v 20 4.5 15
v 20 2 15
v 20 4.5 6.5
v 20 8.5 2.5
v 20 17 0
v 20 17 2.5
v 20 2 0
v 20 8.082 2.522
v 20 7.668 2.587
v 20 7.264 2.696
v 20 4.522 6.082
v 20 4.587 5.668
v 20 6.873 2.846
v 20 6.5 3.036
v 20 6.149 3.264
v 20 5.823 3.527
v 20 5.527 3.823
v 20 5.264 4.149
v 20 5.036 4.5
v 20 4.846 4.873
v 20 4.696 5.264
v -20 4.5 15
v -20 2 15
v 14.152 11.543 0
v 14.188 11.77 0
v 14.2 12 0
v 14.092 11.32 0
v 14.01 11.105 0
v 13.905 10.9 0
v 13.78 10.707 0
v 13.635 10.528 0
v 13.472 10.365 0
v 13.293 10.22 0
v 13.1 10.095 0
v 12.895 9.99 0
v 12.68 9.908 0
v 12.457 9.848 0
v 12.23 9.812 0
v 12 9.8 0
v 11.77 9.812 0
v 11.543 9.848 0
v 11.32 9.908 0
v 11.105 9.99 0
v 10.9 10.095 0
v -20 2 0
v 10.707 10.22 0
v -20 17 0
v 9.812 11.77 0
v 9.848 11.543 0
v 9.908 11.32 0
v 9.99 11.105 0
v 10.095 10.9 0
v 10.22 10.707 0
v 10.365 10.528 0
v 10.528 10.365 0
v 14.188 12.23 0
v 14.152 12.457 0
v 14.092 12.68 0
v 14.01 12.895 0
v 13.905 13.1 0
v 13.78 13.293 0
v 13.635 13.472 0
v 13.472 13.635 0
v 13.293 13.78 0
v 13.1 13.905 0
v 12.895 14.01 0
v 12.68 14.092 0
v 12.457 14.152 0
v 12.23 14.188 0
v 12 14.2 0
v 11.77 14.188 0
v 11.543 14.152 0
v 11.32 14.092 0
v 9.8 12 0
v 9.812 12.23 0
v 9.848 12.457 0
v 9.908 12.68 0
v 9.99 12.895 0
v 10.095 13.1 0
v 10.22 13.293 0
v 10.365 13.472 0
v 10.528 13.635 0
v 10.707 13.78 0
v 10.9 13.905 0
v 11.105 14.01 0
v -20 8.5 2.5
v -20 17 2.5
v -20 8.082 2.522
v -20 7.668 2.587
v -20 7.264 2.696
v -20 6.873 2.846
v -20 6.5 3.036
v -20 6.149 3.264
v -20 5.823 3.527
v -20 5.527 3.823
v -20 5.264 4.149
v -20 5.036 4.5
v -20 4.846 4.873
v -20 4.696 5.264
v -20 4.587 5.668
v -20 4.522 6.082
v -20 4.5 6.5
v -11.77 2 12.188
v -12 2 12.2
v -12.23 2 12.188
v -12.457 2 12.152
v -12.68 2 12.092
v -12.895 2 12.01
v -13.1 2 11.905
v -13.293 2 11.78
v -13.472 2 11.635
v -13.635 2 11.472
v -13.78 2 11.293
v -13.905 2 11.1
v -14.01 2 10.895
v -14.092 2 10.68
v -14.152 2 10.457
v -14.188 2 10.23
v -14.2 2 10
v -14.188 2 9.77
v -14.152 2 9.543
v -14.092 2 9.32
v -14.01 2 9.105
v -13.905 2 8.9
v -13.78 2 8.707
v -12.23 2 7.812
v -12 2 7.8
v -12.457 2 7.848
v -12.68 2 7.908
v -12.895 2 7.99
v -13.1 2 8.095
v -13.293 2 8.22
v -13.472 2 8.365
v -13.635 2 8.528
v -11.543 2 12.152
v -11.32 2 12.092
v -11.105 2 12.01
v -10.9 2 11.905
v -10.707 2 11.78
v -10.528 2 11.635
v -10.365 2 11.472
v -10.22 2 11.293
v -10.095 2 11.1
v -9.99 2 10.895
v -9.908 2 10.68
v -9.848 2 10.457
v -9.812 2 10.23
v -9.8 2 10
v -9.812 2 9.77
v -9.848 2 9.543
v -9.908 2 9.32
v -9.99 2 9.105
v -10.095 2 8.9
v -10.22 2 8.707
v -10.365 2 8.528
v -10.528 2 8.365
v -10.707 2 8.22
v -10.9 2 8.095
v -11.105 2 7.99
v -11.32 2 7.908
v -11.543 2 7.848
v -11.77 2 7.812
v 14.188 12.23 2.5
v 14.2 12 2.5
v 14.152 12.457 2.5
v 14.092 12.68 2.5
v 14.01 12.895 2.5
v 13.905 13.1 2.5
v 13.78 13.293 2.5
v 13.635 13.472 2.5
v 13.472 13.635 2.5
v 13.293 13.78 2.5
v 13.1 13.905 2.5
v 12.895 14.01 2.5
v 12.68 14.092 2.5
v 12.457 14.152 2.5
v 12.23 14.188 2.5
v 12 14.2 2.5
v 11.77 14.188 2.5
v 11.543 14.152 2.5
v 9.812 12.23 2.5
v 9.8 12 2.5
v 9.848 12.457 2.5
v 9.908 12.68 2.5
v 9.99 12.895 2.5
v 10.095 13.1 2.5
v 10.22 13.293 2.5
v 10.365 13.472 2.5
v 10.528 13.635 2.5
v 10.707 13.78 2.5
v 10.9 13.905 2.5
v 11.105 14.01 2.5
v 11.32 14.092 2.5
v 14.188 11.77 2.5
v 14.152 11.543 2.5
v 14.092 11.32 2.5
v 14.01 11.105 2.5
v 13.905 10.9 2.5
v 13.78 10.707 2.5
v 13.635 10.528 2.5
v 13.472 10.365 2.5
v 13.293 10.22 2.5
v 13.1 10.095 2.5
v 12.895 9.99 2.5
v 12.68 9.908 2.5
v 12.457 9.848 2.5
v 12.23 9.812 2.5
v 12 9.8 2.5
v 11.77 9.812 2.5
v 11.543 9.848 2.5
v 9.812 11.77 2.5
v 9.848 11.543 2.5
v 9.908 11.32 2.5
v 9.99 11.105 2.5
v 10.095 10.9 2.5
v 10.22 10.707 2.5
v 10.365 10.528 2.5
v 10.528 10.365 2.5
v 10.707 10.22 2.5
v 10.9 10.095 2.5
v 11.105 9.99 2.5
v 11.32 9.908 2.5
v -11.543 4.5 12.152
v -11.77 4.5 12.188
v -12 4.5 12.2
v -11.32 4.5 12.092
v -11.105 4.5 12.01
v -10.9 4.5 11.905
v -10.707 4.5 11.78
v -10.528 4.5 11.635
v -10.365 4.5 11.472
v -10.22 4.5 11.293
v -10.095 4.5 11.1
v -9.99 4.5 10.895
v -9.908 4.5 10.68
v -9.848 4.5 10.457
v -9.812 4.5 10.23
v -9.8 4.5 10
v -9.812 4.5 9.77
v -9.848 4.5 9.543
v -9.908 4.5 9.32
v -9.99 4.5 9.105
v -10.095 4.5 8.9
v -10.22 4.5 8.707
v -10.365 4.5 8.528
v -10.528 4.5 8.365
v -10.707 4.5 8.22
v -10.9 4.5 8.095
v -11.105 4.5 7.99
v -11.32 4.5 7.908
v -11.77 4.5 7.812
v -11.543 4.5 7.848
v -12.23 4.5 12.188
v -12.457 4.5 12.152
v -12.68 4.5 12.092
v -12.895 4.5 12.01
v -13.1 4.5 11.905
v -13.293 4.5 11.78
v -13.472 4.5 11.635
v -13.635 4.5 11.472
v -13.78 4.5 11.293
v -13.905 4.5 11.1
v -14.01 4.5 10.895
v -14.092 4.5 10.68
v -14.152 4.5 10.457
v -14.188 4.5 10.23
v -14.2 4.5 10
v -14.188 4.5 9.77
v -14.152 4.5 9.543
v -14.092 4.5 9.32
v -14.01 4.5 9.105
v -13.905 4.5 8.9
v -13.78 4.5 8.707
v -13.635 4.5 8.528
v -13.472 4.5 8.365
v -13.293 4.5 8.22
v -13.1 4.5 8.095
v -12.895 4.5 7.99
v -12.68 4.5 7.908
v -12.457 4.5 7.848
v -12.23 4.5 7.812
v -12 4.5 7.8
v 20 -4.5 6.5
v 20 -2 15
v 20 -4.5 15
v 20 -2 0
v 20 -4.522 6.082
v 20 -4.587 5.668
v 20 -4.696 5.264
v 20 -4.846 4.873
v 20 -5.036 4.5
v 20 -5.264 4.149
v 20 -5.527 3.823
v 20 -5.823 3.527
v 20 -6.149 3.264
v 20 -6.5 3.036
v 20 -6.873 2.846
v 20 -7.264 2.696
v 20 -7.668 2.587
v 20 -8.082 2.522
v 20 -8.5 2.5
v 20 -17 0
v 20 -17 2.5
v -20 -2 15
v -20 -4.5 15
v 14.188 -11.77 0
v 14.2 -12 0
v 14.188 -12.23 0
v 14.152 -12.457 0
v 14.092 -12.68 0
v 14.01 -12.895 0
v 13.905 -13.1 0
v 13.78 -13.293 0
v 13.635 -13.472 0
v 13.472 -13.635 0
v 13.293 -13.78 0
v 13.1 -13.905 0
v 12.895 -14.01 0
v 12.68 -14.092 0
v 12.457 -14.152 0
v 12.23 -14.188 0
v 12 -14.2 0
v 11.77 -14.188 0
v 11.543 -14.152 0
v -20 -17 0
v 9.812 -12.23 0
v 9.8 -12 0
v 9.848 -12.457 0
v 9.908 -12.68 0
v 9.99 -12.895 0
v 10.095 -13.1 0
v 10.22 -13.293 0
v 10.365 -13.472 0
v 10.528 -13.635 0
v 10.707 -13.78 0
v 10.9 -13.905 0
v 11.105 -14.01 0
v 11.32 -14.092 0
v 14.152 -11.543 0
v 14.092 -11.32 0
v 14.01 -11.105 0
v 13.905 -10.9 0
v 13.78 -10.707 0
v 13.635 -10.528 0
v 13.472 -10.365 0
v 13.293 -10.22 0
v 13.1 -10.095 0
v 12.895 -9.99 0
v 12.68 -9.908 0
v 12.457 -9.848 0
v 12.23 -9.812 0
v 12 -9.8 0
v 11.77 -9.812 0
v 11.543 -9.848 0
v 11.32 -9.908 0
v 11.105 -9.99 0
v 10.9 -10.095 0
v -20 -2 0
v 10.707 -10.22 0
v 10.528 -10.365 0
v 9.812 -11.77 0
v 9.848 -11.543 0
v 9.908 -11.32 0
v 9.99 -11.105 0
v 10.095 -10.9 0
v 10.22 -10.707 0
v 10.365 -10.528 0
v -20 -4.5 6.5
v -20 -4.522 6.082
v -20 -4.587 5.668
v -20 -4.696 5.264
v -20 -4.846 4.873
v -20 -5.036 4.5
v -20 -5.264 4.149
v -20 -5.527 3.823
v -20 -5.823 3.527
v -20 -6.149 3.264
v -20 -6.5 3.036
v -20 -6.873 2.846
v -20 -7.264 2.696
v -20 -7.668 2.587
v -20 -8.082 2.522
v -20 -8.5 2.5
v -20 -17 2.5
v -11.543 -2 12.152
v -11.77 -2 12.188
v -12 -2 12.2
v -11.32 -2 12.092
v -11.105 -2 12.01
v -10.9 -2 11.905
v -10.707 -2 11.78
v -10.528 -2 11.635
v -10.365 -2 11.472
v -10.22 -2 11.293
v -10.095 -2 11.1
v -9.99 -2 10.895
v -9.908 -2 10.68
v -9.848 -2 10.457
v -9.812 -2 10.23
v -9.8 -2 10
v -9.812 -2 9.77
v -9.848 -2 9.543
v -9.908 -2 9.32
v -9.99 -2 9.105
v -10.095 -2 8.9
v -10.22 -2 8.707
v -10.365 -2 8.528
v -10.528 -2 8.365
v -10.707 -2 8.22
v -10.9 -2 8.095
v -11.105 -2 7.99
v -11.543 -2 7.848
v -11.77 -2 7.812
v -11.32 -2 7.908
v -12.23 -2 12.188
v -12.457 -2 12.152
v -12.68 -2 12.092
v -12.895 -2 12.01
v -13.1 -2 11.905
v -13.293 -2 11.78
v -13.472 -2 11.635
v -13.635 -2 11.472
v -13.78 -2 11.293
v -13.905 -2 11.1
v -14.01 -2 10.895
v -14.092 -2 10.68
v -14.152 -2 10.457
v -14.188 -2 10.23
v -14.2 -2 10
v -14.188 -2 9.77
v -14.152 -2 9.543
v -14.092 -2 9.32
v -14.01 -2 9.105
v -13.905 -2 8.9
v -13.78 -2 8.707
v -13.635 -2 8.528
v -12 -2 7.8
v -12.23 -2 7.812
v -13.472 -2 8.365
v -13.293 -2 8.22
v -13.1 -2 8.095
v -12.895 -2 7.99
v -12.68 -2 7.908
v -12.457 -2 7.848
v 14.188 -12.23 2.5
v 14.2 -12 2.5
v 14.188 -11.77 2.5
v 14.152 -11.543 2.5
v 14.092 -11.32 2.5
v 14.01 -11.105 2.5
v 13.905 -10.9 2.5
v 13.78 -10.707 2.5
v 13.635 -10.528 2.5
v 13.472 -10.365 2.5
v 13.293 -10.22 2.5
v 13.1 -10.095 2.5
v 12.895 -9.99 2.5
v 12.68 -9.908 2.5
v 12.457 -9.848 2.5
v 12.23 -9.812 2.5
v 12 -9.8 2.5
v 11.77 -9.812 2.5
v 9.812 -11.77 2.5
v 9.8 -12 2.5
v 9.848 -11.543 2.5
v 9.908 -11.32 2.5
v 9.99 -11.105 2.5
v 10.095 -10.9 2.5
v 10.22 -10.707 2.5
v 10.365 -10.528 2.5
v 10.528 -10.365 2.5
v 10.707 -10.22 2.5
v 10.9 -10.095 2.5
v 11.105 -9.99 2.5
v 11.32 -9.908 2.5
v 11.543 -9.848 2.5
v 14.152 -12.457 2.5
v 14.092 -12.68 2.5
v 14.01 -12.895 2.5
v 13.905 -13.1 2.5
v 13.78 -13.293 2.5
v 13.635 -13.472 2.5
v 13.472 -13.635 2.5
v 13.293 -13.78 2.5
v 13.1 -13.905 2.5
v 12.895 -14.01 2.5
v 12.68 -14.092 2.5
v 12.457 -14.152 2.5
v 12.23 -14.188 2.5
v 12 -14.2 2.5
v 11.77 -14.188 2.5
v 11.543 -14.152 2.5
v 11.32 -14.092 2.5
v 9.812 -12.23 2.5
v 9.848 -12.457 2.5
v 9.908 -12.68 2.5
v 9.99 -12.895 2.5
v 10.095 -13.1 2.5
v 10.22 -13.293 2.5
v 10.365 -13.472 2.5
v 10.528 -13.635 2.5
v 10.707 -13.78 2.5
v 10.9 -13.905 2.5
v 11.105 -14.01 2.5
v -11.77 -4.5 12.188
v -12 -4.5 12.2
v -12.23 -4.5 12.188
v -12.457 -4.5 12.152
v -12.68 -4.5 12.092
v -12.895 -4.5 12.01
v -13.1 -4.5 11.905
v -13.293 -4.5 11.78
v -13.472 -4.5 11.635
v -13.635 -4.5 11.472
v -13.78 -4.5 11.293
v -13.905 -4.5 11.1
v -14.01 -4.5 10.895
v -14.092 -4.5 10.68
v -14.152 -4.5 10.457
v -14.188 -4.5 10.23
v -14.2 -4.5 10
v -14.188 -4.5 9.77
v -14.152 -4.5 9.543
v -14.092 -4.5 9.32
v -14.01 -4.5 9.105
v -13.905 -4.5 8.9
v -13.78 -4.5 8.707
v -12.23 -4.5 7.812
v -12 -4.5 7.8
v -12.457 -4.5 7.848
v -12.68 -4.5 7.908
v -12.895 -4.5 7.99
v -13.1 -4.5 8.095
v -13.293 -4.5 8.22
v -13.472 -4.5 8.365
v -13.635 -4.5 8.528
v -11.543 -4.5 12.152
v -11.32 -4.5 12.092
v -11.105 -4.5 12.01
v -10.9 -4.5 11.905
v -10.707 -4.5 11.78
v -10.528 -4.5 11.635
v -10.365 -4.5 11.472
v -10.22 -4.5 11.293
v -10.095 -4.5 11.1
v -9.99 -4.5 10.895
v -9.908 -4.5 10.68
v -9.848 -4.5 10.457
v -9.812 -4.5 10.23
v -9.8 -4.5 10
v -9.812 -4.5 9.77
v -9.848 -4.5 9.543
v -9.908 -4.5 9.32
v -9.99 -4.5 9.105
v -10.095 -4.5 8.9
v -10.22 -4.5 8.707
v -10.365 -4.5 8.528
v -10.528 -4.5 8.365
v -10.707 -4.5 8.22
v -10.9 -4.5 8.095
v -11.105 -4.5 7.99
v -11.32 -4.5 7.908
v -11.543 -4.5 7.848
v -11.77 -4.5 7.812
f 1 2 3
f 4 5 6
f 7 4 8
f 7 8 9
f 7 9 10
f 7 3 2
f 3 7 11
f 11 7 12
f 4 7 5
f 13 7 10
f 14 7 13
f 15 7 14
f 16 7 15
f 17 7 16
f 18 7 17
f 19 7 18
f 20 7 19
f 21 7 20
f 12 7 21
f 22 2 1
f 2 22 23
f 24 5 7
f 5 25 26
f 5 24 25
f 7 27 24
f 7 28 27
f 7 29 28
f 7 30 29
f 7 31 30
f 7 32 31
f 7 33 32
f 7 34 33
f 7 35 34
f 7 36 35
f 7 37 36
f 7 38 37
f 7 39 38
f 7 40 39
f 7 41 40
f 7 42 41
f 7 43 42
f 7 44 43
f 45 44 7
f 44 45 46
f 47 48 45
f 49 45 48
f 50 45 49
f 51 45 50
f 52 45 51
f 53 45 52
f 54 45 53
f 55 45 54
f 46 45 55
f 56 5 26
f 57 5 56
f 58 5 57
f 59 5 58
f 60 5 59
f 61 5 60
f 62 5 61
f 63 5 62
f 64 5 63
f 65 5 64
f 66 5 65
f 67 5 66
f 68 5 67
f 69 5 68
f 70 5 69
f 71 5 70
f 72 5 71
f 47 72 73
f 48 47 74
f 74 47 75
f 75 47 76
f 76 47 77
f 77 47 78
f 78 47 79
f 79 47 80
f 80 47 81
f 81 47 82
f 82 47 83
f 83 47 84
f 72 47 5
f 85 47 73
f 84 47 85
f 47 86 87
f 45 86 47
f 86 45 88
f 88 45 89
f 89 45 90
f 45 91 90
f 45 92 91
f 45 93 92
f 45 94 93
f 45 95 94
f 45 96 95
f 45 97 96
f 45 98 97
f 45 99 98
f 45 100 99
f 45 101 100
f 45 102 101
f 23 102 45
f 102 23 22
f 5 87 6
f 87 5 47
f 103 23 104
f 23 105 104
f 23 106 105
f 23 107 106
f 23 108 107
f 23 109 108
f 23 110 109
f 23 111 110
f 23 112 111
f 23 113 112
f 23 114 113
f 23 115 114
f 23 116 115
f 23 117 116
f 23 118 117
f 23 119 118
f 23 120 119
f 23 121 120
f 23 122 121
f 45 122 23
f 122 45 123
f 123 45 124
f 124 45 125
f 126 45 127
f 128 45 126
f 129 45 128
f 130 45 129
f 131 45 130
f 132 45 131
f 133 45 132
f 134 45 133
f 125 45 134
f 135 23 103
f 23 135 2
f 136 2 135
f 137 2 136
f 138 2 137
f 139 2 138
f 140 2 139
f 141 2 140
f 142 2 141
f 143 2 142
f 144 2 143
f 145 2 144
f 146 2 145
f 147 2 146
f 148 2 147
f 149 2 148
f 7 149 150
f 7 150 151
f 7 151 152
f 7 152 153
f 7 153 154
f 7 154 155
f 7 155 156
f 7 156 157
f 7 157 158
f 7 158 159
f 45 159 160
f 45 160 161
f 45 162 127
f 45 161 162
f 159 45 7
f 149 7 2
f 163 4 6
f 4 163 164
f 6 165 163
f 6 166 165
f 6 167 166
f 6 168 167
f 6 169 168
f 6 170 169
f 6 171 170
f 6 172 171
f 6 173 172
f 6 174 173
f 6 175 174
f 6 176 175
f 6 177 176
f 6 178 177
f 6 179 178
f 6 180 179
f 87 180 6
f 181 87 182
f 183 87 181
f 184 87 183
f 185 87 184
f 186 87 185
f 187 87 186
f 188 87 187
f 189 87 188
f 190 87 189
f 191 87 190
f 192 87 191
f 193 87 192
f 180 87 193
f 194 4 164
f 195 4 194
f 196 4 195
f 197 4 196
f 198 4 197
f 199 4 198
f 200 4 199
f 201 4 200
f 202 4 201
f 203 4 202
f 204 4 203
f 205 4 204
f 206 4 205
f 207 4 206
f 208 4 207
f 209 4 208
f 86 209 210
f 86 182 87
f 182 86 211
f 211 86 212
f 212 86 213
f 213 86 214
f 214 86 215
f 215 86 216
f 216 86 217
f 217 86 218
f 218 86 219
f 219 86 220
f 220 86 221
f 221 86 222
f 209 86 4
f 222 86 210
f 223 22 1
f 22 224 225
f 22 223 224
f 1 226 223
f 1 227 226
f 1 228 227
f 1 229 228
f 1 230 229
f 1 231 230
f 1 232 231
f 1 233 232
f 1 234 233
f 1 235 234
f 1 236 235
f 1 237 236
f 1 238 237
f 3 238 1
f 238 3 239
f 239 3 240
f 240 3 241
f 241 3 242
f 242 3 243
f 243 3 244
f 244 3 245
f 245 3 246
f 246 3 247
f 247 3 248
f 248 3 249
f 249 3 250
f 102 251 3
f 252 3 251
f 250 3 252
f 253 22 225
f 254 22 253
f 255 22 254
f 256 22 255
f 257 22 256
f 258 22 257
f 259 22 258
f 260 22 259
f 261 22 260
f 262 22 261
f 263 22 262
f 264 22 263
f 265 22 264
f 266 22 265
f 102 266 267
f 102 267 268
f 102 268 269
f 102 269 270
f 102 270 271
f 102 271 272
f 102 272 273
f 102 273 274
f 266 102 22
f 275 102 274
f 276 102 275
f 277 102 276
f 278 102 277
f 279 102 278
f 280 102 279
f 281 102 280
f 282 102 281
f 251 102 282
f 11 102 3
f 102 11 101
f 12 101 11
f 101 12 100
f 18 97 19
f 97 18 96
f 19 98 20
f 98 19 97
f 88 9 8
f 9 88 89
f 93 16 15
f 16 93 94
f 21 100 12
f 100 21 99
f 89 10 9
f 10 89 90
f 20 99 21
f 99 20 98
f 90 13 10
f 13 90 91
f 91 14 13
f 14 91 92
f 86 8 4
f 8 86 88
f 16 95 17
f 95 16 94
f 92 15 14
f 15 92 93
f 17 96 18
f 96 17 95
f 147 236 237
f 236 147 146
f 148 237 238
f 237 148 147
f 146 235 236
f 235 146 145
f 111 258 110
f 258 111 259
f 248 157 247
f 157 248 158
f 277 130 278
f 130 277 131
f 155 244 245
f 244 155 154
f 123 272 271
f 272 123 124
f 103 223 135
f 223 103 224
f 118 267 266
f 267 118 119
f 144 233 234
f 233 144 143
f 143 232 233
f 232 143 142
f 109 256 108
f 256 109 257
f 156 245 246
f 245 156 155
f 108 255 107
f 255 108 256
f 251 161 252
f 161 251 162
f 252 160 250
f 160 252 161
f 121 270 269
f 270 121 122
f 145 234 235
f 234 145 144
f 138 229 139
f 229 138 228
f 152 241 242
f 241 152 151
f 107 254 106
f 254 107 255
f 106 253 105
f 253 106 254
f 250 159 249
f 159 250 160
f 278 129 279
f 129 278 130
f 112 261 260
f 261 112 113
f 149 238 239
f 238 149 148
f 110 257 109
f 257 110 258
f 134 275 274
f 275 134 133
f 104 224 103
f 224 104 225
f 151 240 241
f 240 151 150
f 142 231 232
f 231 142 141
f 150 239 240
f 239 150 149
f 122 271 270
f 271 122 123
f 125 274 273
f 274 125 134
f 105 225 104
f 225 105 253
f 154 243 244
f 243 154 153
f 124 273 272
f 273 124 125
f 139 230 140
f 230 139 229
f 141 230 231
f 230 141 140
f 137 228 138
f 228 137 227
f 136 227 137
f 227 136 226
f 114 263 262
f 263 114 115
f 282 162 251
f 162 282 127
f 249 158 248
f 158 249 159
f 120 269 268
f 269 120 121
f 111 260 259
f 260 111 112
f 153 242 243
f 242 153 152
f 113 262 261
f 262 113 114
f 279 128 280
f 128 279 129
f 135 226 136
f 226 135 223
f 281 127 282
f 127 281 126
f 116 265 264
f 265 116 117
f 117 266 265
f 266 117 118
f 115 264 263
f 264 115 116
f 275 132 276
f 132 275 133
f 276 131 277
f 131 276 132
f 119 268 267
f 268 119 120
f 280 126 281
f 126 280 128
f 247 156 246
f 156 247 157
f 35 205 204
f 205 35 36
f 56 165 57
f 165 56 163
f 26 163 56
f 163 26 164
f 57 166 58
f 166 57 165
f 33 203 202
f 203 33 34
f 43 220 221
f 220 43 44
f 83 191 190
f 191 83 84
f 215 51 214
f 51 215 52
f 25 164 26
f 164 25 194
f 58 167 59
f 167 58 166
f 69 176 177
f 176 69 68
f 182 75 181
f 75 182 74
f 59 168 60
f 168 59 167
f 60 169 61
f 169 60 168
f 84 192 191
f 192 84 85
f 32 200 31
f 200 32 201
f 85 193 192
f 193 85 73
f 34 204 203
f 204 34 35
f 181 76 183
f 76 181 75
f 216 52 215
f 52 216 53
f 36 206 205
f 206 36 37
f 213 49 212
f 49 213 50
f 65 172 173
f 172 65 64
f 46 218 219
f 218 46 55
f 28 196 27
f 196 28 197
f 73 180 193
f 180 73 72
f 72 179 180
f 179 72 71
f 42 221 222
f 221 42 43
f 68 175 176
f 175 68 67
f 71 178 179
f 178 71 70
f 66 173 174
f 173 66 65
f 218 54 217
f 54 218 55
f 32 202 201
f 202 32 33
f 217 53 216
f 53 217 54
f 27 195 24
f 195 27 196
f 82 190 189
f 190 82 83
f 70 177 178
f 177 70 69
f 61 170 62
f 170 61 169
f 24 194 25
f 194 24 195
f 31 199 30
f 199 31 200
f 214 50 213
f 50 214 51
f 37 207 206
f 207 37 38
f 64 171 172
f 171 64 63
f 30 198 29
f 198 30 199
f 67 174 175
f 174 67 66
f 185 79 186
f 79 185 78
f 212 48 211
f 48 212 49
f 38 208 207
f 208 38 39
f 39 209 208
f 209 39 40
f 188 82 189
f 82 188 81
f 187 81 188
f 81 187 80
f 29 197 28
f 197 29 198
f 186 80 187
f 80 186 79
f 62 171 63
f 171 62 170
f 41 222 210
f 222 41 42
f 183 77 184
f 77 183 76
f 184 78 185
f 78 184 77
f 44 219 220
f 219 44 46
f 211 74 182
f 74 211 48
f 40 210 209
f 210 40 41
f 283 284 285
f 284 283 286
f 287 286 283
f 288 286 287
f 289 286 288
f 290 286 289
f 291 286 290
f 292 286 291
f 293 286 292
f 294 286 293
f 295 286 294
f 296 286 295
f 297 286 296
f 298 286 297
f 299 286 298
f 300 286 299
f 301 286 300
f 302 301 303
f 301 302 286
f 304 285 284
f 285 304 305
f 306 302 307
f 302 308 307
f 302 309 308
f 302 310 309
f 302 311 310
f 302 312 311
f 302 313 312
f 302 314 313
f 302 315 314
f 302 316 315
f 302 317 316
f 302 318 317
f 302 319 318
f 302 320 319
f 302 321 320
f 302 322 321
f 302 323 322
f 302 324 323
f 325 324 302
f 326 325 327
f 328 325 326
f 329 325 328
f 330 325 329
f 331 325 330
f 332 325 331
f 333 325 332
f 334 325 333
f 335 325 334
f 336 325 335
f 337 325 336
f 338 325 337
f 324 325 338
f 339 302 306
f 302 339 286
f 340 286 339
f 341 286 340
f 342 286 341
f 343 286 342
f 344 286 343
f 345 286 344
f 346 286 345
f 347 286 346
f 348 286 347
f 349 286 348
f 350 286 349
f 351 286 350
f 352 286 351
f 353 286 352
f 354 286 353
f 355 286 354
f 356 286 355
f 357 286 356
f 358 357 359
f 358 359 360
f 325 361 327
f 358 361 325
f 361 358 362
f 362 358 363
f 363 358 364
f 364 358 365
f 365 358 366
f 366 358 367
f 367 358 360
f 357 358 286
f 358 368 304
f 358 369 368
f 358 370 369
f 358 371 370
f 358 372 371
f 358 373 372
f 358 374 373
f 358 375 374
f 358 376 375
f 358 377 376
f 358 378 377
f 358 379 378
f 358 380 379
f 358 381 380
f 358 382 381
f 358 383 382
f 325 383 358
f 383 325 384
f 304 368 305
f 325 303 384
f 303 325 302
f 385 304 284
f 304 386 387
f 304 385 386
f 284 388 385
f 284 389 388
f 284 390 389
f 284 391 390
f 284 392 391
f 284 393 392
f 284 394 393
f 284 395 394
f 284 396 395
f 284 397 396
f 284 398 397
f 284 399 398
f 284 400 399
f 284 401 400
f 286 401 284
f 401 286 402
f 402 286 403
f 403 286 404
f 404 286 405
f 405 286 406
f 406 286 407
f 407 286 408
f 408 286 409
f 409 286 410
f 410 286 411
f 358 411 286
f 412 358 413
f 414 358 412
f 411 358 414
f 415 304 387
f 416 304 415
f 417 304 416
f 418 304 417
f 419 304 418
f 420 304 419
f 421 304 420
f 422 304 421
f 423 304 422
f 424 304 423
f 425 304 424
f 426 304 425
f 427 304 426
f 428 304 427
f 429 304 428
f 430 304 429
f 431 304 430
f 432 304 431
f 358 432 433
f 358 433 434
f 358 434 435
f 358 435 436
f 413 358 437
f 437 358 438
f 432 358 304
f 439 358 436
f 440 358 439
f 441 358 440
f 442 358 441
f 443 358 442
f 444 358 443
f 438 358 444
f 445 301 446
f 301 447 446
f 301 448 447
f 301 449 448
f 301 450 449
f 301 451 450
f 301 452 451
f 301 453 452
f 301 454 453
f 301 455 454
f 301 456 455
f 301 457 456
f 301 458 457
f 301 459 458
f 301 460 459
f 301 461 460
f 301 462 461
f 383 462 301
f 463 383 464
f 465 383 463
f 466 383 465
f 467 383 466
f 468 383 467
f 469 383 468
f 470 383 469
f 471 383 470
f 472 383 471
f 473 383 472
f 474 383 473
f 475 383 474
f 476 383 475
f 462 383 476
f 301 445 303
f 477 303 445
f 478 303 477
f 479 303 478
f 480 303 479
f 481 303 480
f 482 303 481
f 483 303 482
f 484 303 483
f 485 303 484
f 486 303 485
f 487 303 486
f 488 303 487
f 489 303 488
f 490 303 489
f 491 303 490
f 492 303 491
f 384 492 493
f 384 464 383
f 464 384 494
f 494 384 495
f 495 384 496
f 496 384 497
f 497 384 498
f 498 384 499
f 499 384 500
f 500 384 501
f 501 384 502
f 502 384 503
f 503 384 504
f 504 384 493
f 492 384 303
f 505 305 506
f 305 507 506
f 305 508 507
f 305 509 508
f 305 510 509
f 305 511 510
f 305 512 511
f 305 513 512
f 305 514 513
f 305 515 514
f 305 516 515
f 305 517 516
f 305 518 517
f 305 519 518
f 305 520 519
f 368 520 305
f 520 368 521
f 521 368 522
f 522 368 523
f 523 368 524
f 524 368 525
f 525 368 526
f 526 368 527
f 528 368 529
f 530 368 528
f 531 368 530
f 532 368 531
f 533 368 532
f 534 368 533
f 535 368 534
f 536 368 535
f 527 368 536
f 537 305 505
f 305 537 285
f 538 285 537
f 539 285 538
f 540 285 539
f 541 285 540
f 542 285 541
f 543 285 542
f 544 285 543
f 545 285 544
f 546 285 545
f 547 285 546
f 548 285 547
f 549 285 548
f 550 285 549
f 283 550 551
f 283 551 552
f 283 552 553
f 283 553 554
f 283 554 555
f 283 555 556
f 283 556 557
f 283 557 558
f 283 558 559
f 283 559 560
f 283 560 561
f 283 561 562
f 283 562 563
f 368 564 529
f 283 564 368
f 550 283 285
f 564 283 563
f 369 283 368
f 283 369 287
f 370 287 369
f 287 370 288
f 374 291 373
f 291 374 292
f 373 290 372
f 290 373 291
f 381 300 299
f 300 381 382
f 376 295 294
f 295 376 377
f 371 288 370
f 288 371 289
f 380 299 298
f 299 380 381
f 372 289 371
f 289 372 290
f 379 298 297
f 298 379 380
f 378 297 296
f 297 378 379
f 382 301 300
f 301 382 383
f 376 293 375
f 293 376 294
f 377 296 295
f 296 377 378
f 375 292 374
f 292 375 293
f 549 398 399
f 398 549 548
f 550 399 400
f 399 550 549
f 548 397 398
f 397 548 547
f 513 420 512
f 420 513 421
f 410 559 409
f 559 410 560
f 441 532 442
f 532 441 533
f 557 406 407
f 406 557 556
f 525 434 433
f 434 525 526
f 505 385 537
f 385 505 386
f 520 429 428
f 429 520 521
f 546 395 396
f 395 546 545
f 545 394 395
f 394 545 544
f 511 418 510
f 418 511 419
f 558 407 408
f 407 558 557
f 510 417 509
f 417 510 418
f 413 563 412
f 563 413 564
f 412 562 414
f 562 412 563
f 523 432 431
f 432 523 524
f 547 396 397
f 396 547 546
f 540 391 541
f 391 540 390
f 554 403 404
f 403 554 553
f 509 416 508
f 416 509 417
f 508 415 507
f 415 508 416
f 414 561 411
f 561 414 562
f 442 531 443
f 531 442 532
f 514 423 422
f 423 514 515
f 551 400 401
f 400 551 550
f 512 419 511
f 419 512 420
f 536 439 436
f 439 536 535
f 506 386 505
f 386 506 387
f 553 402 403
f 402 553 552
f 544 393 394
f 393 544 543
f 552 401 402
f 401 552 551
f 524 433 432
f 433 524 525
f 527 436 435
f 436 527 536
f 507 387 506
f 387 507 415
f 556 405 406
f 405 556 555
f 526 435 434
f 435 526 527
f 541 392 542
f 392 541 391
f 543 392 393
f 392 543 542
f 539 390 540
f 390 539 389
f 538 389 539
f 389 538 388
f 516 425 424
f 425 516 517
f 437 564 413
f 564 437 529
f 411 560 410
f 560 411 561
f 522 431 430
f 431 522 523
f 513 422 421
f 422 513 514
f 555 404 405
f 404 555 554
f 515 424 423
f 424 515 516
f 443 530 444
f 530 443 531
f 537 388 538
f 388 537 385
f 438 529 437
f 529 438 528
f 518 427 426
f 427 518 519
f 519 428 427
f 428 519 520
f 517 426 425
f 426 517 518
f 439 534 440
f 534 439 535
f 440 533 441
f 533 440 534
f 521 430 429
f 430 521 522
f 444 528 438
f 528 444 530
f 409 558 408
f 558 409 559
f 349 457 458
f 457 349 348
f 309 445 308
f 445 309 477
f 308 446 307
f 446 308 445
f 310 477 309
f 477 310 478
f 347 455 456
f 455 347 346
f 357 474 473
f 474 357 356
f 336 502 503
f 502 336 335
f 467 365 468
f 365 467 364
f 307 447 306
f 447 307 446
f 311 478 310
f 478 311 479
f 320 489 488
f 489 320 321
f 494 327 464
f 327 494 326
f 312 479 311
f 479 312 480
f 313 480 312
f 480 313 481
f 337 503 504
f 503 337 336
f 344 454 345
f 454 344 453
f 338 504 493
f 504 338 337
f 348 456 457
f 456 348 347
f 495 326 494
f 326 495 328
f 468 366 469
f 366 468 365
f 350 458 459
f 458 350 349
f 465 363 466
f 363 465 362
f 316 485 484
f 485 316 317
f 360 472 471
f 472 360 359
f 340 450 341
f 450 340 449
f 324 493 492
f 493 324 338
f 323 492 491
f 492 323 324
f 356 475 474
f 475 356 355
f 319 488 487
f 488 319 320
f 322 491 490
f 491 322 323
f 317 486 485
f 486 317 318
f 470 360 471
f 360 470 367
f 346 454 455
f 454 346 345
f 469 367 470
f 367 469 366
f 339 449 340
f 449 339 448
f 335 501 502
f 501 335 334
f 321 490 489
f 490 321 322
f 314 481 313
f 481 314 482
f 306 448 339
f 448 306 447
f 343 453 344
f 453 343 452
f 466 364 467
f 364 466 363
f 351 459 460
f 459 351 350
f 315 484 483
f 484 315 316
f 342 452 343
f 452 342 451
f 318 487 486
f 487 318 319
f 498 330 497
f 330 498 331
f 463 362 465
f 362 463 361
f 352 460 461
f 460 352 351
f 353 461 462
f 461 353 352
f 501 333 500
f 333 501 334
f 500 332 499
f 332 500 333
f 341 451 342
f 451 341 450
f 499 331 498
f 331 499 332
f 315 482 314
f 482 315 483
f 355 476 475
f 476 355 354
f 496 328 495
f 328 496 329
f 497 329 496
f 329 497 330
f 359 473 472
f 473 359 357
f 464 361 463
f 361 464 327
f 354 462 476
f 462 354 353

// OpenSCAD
////////////////////////////////////////////////////////////////////////////////
// A special L bracket I used when building a storage cubby in the TV delete
// Copyright 2025-2026 Daniel Azuma
////////////////////////////////////////////////////////////////////////////////

////////////////////////////////////////////////////////////////////////////////
// You can adjust some parameters here.

// Which target to render. Possible values include:
// "all-pieces", "left-bracket", "right-bracket".
TARGET = "all-pieces";

SCREW_RADIUS = 2.2;
LENGTH = 40;
THICKNESS = 2.5;
BEVEL_RADIUS = 4;
WIDTH = 15;
HOLE_HOFFSET = 8;
HOLE_VOFFSET = 10;
CIRCLE_SIDES = 60;
EPSILON = 0.1;
OBJECT_SPACING = 2;

////////////////////////////////////////////////////////////////////////////////
// Model implementation

module bracket() {
  difference() {
    union() {
      difference() {
        translate([0, WIDTH/2, WIDTH/2]) {
          cube([LENGTH, WIDTH, WIDTH], center = true);
        }
        translate([0, WIDTH/2 + THICKNESS, WIDTH/2 + THICKNESS]) {
          cube([LENGTH + EPSILON, WIDTH, WIDTH], center = true);
        }
      }
      difference() {
        width2 = THICKNESS + BEVEL_RADIUS;
        translate([0, width2/2, width2/2]) {
          cube([LENGTH, width2, width2], center = true);
        }
        translate([0, width2, width2]) {
          rotate([0, 90, 0]) {
            cylinder(h = LENGTH + EPSILON, r = BEVEL_RADIUS, center = true, $fn = CIRCLE_SIDES);
          }
        }
      }
    }
    translate([HOLE_HOFFSET - LENGTH/2, 0, HOLE_VOFFSET]) {
      rotate([90, 0, 0]) {
        cylinder(h = WIDTH, r = SCREW_RADIUS, center = true, $fn = CIRCLE_SIDES);
      }
    }
    translate([LENGTH / 2 - HOLE_HOFFSET, HOLE_VOFFSET, 0]) {
      cylinder(h = WIDTH, r = SCREW_RADIUS, center = true, $fn = CIRCLE_SIDES);
    }
  }
}

////////////////////////////////////////////////////////////////////////////////
// Rendering

module left_bracket() {
  translate([0, OBJECT_SPACING, 0]) {
    bracket();
  }
}

module right_bracket() {
  translate([0, -OBJECT_SPACING, 0]) {
    mirror([0, 1, 0]) {
      bracket();
    }
  }
}

if (TARGET == "all-pieces") {
  left_bracket();
  right_bracket();
}
else if (TARGET == "left-bracket") {
  left_bracket();
}
else if (TARGET == "right-bracket") {
  right_bracket();
}
else {
  echo("ERROR: Unknown TARGET value: ", TARGET);
}
